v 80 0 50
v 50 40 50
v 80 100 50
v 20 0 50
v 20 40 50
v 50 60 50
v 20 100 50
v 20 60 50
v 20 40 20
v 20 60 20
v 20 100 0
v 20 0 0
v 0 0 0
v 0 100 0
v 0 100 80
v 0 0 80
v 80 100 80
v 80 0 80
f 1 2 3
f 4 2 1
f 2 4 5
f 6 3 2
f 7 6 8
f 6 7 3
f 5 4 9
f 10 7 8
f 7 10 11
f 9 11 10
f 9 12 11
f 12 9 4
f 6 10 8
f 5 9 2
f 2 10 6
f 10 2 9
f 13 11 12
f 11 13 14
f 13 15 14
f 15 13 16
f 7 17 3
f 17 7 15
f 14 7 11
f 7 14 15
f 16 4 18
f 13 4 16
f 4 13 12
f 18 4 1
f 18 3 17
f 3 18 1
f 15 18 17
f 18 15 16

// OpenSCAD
union() {
    cube([20, 100, 50]);
    translate([0,0,50])
        cube([80, 100, 30]);

    translate ([20,40,20])
        difference () {
            cube([40, 20, 30]);
            rotate (45, [0, 1, 0])
                cube([80, 20, 80]);
        }
}
